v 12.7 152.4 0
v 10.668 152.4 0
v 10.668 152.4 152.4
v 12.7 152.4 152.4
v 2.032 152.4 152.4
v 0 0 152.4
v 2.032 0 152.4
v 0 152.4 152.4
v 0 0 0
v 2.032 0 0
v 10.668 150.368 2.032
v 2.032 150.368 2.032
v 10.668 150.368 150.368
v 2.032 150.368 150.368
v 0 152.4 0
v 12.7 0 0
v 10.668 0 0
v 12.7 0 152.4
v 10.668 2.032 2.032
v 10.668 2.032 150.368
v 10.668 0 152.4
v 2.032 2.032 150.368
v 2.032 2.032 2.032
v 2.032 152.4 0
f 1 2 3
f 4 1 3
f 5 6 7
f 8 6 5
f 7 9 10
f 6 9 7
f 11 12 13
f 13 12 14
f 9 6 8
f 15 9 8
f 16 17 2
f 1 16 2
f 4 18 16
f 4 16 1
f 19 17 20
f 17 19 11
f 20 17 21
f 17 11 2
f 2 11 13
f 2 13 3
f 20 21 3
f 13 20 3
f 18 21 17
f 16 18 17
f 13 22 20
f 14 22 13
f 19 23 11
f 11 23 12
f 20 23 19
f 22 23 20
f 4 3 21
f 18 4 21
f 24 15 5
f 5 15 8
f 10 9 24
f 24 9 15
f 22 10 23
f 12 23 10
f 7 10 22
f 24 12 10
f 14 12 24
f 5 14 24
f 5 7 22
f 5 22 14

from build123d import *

# Parameters (mm, degrees)
F0_W     = 152.4
F0_H     = 152.4
F1_DEPTH = 2.032
F2_W     = 148.336
F2_H     = 148.336
F3_DEPTH = 8.636
F4_W     = 148.336
F4_H     = 148.336
F5_DEPTH = 2.032


with BuildPart() as f1:
    # F0 (on Right) → F1 (new body)
    with BuildSketch(Plane.YZ):
        with Locations((76.2, 76.2)):
            Rectangle(F0_W, F0_H)
    extrude(amount=F1_DEPTH)

    # F2 (on face) → F3 (join)
    with BuildSketch(Plane.YZ.offset(2.032)):
        with Locations((76.2, 76.2)):
            Rectangle(F2_W, F2_H)
    extrude(amount=F3_DEPTH)

    # F4 (on face) → F5 (join)
    with BuildSketch(Plane.YZ.offset(10.668)):
        Polygon((0, 152.4), (0, 2.032), (0, 0), (152.4, 0), (152.4, 152.4), align=None)
        with Locations((76.2, 76.2)):
            Rectangle(F4_W, F4_H, mode=Mode.SUBTRACT)
        with Locations((76.2, 76.2)):
            Rectangle(F4_W, F4_H)
    extrude(amount=F5_DEPTH)


solid = f1.part
